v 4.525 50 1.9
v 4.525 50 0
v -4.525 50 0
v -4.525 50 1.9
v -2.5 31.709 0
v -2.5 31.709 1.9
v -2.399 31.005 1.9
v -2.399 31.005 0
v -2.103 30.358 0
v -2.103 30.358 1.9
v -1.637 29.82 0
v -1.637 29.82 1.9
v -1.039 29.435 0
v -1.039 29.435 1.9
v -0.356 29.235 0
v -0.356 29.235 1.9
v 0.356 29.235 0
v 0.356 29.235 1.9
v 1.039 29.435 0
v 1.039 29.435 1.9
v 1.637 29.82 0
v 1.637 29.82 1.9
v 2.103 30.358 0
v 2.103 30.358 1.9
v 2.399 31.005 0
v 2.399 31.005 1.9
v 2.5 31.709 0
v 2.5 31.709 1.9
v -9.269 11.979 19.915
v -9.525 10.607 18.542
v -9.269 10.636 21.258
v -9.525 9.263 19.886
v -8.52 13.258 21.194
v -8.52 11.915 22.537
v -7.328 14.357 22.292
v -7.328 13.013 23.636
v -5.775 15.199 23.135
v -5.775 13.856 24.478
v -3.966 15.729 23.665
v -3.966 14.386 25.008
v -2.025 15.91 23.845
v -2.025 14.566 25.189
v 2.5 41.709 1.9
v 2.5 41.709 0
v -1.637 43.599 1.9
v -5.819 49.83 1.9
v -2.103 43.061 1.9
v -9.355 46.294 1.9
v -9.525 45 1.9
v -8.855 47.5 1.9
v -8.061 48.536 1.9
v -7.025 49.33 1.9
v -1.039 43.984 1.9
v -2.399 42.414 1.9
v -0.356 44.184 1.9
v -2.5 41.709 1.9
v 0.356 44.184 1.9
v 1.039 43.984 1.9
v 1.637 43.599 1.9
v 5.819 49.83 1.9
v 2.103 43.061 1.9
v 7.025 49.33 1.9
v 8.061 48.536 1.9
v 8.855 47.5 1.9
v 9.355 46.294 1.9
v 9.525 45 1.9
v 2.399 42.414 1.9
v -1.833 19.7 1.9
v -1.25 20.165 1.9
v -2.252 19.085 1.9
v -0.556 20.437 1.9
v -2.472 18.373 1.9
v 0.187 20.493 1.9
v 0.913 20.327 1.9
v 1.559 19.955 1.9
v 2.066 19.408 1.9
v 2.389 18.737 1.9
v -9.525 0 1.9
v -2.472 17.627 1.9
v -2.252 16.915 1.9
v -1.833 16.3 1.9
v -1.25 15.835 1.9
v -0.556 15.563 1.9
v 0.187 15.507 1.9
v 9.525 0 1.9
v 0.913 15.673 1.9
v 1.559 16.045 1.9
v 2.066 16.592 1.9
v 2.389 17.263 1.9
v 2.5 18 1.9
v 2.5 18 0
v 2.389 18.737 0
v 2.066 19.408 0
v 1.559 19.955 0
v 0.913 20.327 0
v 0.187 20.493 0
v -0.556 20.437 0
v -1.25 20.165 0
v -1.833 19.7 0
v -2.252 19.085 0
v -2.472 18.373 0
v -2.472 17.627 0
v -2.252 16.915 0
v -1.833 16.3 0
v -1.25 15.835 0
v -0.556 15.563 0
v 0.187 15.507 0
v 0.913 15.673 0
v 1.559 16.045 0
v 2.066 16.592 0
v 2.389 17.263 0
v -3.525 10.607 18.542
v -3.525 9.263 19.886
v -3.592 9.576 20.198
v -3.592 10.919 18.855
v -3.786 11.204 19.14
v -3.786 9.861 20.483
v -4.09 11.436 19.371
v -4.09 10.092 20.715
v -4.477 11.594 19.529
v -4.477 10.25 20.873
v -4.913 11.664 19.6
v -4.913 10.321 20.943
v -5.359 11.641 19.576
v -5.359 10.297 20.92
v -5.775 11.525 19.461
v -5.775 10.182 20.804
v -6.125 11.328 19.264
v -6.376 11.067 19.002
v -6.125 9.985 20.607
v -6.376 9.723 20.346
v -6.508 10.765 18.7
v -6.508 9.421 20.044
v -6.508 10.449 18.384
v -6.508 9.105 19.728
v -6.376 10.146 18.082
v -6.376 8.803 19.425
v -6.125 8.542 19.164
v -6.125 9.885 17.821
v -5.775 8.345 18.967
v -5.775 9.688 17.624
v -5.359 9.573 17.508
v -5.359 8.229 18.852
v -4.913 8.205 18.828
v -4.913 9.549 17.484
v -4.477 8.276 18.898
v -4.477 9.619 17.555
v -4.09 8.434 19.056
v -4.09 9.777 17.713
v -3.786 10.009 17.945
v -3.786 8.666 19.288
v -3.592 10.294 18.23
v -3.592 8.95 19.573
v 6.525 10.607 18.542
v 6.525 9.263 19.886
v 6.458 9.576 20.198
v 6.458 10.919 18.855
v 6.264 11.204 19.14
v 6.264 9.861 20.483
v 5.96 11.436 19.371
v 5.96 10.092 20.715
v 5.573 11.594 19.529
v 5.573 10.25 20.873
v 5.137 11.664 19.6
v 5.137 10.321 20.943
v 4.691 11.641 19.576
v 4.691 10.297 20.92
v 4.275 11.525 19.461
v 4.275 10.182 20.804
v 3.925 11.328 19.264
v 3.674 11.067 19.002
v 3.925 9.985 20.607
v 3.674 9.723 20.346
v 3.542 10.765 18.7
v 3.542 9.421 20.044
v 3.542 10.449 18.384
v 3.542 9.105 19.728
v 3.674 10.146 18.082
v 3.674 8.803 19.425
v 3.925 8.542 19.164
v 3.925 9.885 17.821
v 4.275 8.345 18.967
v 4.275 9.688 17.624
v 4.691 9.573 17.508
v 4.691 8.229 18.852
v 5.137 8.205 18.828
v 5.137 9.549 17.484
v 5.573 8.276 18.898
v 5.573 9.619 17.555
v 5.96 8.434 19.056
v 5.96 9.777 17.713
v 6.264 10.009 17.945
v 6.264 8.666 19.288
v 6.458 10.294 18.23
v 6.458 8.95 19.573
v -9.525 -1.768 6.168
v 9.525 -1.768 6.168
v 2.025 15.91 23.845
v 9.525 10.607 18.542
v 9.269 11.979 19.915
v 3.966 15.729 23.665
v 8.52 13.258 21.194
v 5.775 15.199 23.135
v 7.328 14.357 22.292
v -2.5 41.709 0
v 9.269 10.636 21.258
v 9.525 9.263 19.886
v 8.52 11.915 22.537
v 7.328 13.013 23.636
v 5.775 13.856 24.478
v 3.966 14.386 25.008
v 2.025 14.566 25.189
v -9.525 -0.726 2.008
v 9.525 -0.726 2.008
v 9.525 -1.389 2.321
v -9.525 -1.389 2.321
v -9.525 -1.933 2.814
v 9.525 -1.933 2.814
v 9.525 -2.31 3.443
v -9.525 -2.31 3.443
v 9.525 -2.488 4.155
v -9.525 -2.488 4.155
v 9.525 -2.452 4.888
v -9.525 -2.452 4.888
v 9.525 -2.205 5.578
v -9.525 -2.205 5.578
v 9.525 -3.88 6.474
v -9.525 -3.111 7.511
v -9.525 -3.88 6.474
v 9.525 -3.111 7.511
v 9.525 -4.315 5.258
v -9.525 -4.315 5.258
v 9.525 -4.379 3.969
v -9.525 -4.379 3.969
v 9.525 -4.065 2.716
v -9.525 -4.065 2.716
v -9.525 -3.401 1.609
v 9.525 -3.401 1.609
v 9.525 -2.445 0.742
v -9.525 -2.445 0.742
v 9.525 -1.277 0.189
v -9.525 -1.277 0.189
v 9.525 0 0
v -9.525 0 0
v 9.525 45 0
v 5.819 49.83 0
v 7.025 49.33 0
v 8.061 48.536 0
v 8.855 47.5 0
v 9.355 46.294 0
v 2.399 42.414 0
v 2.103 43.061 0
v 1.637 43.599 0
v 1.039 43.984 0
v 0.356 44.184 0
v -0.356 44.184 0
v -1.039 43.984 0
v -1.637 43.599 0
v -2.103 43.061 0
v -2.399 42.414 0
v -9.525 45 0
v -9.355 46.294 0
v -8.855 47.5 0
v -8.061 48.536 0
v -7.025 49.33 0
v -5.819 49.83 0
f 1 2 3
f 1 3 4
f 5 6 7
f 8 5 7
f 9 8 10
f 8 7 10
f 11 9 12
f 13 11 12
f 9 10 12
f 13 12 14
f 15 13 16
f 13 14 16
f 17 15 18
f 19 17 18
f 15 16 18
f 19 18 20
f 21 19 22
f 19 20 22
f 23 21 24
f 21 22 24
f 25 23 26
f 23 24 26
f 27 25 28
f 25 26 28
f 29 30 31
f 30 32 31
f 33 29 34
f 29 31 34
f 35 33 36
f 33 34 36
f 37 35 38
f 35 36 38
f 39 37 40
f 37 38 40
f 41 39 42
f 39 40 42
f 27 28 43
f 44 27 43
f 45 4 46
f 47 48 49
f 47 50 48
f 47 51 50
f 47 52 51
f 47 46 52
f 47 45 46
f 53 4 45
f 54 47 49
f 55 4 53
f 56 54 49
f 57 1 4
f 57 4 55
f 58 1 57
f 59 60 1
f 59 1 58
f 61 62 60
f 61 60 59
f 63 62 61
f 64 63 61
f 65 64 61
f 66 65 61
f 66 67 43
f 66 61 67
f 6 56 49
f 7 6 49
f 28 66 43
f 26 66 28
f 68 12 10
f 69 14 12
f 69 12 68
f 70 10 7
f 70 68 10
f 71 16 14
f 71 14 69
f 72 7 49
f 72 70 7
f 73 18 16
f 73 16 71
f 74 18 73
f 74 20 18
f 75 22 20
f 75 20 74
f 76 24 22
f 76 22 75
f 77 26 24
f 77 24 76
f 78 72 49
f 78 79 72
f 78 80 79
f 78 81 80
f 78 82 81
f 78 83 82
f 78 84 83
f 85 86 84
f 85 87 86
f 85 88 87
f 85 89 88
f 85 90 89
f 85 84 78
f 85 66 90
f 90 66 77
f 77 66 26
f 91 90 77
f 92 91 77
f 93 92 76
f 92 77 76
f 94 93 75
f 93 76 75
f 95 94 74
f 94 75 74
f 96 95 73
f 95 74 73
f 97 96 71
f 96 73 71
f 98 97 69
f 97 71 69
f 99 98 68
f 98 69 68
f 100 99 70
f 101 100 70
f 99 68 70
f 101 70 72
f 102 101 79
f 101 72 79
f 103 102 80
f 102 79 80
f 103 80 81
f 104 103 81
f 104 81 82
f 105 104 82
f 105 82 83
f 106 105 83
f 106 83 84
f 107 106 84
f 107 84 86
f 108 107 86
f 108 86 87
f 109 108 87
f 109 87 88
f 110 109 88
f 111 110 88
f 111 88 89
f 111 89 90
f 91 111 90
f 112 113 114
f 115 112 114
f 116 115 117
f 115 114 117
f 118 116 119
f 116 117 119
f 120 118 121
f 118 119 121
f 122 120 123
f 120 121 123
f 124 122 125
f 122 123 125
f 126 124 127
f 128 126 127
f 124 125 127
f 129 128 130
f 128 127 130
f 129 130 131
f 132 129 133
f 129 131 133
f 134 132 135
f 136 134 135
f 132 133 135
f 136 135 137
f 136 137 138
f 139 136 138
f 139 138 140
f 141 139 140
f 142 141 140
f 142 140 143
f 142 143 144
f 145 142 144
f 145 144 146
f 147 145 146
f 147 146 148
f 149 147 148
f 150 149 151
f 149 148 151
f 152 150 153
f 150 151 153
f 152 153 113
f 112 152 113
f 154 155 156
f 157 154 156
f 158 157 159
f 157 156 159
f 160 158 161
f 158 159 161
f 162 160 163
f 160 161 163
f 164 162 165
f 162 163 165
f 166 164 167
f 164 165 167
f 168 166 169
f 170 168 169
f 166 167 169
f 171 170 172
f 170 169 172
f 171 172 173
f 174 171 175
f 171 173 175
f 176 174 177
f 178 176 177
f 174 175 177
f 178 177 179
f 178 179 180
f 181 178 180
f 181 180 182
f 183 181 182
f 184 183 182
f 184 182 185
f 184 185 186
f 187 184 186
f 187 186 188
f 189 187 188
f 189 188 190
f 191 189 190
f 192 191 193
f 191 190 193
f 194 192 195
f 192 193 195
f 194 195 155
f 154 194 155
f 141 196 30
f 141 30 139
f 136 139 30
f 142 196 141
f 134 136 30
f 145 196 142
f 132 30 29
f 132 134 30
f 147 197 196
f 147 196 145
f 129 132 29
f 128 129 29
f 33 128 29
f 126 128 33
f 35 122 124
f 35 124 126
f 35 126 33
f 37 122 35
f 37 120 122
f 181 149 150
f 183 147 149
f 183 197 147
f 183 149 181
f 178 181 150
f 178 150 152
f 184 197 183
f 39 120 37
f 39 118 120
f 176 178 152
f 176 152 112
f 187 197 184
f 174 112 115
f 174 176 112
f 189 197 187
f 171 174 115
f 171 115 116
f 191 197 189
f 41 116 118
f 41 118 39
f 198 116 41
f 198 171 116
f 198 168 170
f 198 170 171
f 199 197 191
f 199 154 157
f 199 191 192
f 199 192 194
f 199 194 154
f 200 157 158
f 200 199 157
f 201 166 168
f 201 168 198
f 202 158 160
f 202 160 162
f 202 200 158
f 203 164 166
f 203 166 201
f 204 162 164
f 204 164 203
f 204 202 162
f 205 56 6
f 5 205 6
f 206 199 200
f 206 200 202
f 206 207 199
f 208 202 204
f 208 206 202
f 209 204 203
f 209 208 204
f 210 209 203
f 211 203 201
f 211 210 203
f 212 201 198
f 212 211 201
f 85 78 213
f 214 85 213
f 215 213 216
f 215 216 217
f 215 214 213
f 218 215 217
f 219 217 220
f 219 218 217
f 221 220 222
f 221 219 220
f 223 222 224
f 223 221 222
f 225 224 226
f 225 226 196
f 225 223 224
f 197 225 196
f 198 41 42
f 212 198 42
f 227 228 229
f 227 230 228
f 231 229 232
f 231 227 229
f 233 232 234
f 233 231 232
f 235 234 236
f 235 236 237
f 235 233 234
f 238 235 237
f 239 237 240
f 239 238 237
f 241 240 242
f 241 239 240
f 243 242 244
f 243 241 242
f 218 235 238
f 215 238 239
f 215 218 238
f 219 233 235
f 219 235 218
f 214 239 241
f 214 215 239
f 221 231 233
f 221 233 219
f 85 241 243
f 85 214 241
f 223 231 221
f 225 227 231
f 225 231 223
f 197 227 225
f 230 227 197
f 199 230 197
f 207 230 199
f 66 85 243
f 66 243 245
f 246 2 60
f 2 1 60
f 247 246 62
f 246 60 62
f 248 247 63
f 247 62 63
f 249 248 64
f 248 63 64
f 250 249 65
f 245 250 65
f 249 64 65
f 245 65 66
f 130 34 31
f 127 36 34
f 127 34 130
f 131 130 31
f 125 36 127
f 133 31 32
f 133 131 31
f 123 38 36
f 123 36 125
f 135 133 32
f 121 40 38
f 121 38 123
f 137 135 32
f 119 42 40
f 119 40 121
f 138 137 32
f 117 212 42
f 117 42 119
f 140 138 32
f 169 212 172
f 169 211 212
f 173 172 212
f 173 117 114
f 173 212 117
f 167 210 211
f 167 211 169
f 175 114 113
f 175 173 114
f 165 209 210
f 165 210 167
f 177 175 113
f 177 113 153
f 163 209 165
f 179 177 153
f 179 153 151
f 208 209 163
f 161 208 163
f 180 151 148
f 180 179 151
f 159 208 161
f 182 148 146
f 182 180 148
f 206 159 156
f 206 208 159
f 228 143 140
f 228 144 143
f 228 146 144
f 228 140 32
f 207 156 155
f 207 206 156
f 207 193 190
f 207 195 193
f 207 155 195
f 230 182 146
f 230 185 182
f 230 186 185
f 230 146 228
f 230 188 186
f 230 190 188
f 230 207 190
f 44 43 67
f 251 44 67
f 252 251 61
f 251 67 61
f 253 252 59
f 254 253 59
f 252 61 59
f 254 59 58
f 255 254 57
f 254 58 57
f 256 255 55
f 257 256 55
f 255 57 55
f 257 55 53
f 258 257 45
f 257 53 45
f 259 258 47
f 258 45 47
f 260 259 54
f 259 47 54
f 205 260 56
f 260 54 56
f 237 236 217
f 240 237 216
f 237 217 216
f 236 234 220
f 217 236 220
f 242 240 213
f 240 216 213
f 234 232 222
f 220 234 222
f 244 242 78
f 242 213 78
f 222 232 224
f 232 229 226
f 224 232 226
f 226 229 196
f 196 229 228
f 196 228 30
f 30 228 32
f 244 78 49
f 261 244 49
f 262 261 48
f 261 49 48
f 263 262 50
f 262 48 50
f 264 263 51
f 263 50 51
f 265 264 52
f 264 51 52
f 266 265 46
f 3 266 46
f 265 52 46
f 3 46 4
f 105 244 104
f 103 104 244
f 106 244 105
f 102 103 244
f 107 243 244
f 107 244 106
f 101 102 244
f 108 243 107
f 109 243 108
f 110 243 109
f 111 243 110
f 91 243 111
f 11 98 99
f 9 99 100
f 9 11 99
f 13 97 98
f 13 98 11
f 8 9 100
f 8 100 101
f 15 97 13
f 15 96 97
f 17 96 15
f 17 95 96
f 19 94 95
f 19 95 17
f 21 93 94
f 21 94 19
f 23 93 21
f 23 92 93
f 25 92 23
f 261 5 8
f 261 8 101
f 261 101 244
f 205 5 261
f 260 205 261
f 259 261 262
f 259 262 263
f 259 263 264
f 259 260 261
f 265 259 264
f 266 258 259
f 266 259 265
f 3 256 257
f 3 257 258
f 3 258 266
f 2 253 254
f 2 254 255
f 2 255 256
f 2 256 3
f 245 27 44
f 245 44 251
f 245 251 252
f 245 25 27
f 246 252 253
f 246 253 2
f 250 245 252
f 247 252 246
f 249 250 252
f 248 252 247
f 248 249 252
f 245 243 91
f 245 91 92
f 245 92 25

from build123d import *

# Parameters (mm, degrees)
F1_DEPTH = 9.525
F2_R     = 2.5
F3_DEPTH = 1.901
F4_R     = 1.5
F5_DEPTH = 1.9
F6_R     = 7.5
F7_R     = 5


with BuildPart() as f1:
    # F0 (on Right) → F1 (new body, symmetric)
    with BuildSketch(Plane.YZ):
        with BuildLine():
            ThreePointArc((-3.1112698372, 7.5112698372), (-4.065069943, 2.7161928976), (0, 0))
            Line((0, 0), (50, 0))
            Line((50, 0), (50, 1.9))
            Line((50, 1.9), (0, 1.9))
            ThreePointArc((0, 1.9), (-2.3096988313, 3.4432914191), (-1.767766953, 6.167766953))
            Line((-1.767766953, 6.167766953), (15.9099025767, 23.8454364826))
            Line((15.9099025767, 23.8454364826), (14.5663996924, 25.1889393669))
            Line((14.5663996924, 25.1889393669), (-3.1112698372, 7.5112698372))
        make_face()
    extrude(amount=F1_DEPTH, both=True)

    # F2 (on face) → F3 (cut, through all)
    with BuildSketch(Plane.XY.offset(1.9)):
        with Locations((0, 18)):
            Circle(F2_R)
        with BuildLine():
            Line((2.5, 31.7094863951), (2.5, 41.7094863951))
            ThreePointArc((2.5, 41.7094863951), (0, 44.2094863951), (-2.5, 41.7094863951))
            Line((-2.5, 41.7094863951), (-2.5, 31.7094863951))
            ThreePointArc((-2.5, 31.7094863951), (0, 29.2094863951), (2.5, 31.7094863951))
        make_face()
    extrude(amount=-F3_DEPTH, mode=Mode.SUBTRACT)

    # F4 (on face) → F5 (cut)
    with BuildSketch(Plane(origin=(0, -5.3112698372, 5.3112698372), x_dir=(1, 0, 0), z_dir=(0, -0.7071067812, 0.7071067812))):
        with Locations((-5.025, 20.6112698372)):
            Circle(F4_R)
        with Locations((5.025, 20.6112698372)):
            Circle(F4_R)
    extrude(amount=-F5_DEPTH, mode=Mode.SUBTRACT)

    # F6
    f6_edges = [f1.edges().sort_by_distance(p)[0] for p in [
        (9.525, 15.238151, 24.517188),
        (-9.525, 15.238151, 24.517188),
    ]]
    fillet(f6_edges, radius=F6_R)

    # F7
    f7_edges = [f1.edges().sort_by_distance(p)[0] for p in [
        (-9.525, 50, 0.95),
        (9.525, 50, 0.95),
    ]]
    fillet(f7_edges, radius=F7_R)


solid = f1.part
